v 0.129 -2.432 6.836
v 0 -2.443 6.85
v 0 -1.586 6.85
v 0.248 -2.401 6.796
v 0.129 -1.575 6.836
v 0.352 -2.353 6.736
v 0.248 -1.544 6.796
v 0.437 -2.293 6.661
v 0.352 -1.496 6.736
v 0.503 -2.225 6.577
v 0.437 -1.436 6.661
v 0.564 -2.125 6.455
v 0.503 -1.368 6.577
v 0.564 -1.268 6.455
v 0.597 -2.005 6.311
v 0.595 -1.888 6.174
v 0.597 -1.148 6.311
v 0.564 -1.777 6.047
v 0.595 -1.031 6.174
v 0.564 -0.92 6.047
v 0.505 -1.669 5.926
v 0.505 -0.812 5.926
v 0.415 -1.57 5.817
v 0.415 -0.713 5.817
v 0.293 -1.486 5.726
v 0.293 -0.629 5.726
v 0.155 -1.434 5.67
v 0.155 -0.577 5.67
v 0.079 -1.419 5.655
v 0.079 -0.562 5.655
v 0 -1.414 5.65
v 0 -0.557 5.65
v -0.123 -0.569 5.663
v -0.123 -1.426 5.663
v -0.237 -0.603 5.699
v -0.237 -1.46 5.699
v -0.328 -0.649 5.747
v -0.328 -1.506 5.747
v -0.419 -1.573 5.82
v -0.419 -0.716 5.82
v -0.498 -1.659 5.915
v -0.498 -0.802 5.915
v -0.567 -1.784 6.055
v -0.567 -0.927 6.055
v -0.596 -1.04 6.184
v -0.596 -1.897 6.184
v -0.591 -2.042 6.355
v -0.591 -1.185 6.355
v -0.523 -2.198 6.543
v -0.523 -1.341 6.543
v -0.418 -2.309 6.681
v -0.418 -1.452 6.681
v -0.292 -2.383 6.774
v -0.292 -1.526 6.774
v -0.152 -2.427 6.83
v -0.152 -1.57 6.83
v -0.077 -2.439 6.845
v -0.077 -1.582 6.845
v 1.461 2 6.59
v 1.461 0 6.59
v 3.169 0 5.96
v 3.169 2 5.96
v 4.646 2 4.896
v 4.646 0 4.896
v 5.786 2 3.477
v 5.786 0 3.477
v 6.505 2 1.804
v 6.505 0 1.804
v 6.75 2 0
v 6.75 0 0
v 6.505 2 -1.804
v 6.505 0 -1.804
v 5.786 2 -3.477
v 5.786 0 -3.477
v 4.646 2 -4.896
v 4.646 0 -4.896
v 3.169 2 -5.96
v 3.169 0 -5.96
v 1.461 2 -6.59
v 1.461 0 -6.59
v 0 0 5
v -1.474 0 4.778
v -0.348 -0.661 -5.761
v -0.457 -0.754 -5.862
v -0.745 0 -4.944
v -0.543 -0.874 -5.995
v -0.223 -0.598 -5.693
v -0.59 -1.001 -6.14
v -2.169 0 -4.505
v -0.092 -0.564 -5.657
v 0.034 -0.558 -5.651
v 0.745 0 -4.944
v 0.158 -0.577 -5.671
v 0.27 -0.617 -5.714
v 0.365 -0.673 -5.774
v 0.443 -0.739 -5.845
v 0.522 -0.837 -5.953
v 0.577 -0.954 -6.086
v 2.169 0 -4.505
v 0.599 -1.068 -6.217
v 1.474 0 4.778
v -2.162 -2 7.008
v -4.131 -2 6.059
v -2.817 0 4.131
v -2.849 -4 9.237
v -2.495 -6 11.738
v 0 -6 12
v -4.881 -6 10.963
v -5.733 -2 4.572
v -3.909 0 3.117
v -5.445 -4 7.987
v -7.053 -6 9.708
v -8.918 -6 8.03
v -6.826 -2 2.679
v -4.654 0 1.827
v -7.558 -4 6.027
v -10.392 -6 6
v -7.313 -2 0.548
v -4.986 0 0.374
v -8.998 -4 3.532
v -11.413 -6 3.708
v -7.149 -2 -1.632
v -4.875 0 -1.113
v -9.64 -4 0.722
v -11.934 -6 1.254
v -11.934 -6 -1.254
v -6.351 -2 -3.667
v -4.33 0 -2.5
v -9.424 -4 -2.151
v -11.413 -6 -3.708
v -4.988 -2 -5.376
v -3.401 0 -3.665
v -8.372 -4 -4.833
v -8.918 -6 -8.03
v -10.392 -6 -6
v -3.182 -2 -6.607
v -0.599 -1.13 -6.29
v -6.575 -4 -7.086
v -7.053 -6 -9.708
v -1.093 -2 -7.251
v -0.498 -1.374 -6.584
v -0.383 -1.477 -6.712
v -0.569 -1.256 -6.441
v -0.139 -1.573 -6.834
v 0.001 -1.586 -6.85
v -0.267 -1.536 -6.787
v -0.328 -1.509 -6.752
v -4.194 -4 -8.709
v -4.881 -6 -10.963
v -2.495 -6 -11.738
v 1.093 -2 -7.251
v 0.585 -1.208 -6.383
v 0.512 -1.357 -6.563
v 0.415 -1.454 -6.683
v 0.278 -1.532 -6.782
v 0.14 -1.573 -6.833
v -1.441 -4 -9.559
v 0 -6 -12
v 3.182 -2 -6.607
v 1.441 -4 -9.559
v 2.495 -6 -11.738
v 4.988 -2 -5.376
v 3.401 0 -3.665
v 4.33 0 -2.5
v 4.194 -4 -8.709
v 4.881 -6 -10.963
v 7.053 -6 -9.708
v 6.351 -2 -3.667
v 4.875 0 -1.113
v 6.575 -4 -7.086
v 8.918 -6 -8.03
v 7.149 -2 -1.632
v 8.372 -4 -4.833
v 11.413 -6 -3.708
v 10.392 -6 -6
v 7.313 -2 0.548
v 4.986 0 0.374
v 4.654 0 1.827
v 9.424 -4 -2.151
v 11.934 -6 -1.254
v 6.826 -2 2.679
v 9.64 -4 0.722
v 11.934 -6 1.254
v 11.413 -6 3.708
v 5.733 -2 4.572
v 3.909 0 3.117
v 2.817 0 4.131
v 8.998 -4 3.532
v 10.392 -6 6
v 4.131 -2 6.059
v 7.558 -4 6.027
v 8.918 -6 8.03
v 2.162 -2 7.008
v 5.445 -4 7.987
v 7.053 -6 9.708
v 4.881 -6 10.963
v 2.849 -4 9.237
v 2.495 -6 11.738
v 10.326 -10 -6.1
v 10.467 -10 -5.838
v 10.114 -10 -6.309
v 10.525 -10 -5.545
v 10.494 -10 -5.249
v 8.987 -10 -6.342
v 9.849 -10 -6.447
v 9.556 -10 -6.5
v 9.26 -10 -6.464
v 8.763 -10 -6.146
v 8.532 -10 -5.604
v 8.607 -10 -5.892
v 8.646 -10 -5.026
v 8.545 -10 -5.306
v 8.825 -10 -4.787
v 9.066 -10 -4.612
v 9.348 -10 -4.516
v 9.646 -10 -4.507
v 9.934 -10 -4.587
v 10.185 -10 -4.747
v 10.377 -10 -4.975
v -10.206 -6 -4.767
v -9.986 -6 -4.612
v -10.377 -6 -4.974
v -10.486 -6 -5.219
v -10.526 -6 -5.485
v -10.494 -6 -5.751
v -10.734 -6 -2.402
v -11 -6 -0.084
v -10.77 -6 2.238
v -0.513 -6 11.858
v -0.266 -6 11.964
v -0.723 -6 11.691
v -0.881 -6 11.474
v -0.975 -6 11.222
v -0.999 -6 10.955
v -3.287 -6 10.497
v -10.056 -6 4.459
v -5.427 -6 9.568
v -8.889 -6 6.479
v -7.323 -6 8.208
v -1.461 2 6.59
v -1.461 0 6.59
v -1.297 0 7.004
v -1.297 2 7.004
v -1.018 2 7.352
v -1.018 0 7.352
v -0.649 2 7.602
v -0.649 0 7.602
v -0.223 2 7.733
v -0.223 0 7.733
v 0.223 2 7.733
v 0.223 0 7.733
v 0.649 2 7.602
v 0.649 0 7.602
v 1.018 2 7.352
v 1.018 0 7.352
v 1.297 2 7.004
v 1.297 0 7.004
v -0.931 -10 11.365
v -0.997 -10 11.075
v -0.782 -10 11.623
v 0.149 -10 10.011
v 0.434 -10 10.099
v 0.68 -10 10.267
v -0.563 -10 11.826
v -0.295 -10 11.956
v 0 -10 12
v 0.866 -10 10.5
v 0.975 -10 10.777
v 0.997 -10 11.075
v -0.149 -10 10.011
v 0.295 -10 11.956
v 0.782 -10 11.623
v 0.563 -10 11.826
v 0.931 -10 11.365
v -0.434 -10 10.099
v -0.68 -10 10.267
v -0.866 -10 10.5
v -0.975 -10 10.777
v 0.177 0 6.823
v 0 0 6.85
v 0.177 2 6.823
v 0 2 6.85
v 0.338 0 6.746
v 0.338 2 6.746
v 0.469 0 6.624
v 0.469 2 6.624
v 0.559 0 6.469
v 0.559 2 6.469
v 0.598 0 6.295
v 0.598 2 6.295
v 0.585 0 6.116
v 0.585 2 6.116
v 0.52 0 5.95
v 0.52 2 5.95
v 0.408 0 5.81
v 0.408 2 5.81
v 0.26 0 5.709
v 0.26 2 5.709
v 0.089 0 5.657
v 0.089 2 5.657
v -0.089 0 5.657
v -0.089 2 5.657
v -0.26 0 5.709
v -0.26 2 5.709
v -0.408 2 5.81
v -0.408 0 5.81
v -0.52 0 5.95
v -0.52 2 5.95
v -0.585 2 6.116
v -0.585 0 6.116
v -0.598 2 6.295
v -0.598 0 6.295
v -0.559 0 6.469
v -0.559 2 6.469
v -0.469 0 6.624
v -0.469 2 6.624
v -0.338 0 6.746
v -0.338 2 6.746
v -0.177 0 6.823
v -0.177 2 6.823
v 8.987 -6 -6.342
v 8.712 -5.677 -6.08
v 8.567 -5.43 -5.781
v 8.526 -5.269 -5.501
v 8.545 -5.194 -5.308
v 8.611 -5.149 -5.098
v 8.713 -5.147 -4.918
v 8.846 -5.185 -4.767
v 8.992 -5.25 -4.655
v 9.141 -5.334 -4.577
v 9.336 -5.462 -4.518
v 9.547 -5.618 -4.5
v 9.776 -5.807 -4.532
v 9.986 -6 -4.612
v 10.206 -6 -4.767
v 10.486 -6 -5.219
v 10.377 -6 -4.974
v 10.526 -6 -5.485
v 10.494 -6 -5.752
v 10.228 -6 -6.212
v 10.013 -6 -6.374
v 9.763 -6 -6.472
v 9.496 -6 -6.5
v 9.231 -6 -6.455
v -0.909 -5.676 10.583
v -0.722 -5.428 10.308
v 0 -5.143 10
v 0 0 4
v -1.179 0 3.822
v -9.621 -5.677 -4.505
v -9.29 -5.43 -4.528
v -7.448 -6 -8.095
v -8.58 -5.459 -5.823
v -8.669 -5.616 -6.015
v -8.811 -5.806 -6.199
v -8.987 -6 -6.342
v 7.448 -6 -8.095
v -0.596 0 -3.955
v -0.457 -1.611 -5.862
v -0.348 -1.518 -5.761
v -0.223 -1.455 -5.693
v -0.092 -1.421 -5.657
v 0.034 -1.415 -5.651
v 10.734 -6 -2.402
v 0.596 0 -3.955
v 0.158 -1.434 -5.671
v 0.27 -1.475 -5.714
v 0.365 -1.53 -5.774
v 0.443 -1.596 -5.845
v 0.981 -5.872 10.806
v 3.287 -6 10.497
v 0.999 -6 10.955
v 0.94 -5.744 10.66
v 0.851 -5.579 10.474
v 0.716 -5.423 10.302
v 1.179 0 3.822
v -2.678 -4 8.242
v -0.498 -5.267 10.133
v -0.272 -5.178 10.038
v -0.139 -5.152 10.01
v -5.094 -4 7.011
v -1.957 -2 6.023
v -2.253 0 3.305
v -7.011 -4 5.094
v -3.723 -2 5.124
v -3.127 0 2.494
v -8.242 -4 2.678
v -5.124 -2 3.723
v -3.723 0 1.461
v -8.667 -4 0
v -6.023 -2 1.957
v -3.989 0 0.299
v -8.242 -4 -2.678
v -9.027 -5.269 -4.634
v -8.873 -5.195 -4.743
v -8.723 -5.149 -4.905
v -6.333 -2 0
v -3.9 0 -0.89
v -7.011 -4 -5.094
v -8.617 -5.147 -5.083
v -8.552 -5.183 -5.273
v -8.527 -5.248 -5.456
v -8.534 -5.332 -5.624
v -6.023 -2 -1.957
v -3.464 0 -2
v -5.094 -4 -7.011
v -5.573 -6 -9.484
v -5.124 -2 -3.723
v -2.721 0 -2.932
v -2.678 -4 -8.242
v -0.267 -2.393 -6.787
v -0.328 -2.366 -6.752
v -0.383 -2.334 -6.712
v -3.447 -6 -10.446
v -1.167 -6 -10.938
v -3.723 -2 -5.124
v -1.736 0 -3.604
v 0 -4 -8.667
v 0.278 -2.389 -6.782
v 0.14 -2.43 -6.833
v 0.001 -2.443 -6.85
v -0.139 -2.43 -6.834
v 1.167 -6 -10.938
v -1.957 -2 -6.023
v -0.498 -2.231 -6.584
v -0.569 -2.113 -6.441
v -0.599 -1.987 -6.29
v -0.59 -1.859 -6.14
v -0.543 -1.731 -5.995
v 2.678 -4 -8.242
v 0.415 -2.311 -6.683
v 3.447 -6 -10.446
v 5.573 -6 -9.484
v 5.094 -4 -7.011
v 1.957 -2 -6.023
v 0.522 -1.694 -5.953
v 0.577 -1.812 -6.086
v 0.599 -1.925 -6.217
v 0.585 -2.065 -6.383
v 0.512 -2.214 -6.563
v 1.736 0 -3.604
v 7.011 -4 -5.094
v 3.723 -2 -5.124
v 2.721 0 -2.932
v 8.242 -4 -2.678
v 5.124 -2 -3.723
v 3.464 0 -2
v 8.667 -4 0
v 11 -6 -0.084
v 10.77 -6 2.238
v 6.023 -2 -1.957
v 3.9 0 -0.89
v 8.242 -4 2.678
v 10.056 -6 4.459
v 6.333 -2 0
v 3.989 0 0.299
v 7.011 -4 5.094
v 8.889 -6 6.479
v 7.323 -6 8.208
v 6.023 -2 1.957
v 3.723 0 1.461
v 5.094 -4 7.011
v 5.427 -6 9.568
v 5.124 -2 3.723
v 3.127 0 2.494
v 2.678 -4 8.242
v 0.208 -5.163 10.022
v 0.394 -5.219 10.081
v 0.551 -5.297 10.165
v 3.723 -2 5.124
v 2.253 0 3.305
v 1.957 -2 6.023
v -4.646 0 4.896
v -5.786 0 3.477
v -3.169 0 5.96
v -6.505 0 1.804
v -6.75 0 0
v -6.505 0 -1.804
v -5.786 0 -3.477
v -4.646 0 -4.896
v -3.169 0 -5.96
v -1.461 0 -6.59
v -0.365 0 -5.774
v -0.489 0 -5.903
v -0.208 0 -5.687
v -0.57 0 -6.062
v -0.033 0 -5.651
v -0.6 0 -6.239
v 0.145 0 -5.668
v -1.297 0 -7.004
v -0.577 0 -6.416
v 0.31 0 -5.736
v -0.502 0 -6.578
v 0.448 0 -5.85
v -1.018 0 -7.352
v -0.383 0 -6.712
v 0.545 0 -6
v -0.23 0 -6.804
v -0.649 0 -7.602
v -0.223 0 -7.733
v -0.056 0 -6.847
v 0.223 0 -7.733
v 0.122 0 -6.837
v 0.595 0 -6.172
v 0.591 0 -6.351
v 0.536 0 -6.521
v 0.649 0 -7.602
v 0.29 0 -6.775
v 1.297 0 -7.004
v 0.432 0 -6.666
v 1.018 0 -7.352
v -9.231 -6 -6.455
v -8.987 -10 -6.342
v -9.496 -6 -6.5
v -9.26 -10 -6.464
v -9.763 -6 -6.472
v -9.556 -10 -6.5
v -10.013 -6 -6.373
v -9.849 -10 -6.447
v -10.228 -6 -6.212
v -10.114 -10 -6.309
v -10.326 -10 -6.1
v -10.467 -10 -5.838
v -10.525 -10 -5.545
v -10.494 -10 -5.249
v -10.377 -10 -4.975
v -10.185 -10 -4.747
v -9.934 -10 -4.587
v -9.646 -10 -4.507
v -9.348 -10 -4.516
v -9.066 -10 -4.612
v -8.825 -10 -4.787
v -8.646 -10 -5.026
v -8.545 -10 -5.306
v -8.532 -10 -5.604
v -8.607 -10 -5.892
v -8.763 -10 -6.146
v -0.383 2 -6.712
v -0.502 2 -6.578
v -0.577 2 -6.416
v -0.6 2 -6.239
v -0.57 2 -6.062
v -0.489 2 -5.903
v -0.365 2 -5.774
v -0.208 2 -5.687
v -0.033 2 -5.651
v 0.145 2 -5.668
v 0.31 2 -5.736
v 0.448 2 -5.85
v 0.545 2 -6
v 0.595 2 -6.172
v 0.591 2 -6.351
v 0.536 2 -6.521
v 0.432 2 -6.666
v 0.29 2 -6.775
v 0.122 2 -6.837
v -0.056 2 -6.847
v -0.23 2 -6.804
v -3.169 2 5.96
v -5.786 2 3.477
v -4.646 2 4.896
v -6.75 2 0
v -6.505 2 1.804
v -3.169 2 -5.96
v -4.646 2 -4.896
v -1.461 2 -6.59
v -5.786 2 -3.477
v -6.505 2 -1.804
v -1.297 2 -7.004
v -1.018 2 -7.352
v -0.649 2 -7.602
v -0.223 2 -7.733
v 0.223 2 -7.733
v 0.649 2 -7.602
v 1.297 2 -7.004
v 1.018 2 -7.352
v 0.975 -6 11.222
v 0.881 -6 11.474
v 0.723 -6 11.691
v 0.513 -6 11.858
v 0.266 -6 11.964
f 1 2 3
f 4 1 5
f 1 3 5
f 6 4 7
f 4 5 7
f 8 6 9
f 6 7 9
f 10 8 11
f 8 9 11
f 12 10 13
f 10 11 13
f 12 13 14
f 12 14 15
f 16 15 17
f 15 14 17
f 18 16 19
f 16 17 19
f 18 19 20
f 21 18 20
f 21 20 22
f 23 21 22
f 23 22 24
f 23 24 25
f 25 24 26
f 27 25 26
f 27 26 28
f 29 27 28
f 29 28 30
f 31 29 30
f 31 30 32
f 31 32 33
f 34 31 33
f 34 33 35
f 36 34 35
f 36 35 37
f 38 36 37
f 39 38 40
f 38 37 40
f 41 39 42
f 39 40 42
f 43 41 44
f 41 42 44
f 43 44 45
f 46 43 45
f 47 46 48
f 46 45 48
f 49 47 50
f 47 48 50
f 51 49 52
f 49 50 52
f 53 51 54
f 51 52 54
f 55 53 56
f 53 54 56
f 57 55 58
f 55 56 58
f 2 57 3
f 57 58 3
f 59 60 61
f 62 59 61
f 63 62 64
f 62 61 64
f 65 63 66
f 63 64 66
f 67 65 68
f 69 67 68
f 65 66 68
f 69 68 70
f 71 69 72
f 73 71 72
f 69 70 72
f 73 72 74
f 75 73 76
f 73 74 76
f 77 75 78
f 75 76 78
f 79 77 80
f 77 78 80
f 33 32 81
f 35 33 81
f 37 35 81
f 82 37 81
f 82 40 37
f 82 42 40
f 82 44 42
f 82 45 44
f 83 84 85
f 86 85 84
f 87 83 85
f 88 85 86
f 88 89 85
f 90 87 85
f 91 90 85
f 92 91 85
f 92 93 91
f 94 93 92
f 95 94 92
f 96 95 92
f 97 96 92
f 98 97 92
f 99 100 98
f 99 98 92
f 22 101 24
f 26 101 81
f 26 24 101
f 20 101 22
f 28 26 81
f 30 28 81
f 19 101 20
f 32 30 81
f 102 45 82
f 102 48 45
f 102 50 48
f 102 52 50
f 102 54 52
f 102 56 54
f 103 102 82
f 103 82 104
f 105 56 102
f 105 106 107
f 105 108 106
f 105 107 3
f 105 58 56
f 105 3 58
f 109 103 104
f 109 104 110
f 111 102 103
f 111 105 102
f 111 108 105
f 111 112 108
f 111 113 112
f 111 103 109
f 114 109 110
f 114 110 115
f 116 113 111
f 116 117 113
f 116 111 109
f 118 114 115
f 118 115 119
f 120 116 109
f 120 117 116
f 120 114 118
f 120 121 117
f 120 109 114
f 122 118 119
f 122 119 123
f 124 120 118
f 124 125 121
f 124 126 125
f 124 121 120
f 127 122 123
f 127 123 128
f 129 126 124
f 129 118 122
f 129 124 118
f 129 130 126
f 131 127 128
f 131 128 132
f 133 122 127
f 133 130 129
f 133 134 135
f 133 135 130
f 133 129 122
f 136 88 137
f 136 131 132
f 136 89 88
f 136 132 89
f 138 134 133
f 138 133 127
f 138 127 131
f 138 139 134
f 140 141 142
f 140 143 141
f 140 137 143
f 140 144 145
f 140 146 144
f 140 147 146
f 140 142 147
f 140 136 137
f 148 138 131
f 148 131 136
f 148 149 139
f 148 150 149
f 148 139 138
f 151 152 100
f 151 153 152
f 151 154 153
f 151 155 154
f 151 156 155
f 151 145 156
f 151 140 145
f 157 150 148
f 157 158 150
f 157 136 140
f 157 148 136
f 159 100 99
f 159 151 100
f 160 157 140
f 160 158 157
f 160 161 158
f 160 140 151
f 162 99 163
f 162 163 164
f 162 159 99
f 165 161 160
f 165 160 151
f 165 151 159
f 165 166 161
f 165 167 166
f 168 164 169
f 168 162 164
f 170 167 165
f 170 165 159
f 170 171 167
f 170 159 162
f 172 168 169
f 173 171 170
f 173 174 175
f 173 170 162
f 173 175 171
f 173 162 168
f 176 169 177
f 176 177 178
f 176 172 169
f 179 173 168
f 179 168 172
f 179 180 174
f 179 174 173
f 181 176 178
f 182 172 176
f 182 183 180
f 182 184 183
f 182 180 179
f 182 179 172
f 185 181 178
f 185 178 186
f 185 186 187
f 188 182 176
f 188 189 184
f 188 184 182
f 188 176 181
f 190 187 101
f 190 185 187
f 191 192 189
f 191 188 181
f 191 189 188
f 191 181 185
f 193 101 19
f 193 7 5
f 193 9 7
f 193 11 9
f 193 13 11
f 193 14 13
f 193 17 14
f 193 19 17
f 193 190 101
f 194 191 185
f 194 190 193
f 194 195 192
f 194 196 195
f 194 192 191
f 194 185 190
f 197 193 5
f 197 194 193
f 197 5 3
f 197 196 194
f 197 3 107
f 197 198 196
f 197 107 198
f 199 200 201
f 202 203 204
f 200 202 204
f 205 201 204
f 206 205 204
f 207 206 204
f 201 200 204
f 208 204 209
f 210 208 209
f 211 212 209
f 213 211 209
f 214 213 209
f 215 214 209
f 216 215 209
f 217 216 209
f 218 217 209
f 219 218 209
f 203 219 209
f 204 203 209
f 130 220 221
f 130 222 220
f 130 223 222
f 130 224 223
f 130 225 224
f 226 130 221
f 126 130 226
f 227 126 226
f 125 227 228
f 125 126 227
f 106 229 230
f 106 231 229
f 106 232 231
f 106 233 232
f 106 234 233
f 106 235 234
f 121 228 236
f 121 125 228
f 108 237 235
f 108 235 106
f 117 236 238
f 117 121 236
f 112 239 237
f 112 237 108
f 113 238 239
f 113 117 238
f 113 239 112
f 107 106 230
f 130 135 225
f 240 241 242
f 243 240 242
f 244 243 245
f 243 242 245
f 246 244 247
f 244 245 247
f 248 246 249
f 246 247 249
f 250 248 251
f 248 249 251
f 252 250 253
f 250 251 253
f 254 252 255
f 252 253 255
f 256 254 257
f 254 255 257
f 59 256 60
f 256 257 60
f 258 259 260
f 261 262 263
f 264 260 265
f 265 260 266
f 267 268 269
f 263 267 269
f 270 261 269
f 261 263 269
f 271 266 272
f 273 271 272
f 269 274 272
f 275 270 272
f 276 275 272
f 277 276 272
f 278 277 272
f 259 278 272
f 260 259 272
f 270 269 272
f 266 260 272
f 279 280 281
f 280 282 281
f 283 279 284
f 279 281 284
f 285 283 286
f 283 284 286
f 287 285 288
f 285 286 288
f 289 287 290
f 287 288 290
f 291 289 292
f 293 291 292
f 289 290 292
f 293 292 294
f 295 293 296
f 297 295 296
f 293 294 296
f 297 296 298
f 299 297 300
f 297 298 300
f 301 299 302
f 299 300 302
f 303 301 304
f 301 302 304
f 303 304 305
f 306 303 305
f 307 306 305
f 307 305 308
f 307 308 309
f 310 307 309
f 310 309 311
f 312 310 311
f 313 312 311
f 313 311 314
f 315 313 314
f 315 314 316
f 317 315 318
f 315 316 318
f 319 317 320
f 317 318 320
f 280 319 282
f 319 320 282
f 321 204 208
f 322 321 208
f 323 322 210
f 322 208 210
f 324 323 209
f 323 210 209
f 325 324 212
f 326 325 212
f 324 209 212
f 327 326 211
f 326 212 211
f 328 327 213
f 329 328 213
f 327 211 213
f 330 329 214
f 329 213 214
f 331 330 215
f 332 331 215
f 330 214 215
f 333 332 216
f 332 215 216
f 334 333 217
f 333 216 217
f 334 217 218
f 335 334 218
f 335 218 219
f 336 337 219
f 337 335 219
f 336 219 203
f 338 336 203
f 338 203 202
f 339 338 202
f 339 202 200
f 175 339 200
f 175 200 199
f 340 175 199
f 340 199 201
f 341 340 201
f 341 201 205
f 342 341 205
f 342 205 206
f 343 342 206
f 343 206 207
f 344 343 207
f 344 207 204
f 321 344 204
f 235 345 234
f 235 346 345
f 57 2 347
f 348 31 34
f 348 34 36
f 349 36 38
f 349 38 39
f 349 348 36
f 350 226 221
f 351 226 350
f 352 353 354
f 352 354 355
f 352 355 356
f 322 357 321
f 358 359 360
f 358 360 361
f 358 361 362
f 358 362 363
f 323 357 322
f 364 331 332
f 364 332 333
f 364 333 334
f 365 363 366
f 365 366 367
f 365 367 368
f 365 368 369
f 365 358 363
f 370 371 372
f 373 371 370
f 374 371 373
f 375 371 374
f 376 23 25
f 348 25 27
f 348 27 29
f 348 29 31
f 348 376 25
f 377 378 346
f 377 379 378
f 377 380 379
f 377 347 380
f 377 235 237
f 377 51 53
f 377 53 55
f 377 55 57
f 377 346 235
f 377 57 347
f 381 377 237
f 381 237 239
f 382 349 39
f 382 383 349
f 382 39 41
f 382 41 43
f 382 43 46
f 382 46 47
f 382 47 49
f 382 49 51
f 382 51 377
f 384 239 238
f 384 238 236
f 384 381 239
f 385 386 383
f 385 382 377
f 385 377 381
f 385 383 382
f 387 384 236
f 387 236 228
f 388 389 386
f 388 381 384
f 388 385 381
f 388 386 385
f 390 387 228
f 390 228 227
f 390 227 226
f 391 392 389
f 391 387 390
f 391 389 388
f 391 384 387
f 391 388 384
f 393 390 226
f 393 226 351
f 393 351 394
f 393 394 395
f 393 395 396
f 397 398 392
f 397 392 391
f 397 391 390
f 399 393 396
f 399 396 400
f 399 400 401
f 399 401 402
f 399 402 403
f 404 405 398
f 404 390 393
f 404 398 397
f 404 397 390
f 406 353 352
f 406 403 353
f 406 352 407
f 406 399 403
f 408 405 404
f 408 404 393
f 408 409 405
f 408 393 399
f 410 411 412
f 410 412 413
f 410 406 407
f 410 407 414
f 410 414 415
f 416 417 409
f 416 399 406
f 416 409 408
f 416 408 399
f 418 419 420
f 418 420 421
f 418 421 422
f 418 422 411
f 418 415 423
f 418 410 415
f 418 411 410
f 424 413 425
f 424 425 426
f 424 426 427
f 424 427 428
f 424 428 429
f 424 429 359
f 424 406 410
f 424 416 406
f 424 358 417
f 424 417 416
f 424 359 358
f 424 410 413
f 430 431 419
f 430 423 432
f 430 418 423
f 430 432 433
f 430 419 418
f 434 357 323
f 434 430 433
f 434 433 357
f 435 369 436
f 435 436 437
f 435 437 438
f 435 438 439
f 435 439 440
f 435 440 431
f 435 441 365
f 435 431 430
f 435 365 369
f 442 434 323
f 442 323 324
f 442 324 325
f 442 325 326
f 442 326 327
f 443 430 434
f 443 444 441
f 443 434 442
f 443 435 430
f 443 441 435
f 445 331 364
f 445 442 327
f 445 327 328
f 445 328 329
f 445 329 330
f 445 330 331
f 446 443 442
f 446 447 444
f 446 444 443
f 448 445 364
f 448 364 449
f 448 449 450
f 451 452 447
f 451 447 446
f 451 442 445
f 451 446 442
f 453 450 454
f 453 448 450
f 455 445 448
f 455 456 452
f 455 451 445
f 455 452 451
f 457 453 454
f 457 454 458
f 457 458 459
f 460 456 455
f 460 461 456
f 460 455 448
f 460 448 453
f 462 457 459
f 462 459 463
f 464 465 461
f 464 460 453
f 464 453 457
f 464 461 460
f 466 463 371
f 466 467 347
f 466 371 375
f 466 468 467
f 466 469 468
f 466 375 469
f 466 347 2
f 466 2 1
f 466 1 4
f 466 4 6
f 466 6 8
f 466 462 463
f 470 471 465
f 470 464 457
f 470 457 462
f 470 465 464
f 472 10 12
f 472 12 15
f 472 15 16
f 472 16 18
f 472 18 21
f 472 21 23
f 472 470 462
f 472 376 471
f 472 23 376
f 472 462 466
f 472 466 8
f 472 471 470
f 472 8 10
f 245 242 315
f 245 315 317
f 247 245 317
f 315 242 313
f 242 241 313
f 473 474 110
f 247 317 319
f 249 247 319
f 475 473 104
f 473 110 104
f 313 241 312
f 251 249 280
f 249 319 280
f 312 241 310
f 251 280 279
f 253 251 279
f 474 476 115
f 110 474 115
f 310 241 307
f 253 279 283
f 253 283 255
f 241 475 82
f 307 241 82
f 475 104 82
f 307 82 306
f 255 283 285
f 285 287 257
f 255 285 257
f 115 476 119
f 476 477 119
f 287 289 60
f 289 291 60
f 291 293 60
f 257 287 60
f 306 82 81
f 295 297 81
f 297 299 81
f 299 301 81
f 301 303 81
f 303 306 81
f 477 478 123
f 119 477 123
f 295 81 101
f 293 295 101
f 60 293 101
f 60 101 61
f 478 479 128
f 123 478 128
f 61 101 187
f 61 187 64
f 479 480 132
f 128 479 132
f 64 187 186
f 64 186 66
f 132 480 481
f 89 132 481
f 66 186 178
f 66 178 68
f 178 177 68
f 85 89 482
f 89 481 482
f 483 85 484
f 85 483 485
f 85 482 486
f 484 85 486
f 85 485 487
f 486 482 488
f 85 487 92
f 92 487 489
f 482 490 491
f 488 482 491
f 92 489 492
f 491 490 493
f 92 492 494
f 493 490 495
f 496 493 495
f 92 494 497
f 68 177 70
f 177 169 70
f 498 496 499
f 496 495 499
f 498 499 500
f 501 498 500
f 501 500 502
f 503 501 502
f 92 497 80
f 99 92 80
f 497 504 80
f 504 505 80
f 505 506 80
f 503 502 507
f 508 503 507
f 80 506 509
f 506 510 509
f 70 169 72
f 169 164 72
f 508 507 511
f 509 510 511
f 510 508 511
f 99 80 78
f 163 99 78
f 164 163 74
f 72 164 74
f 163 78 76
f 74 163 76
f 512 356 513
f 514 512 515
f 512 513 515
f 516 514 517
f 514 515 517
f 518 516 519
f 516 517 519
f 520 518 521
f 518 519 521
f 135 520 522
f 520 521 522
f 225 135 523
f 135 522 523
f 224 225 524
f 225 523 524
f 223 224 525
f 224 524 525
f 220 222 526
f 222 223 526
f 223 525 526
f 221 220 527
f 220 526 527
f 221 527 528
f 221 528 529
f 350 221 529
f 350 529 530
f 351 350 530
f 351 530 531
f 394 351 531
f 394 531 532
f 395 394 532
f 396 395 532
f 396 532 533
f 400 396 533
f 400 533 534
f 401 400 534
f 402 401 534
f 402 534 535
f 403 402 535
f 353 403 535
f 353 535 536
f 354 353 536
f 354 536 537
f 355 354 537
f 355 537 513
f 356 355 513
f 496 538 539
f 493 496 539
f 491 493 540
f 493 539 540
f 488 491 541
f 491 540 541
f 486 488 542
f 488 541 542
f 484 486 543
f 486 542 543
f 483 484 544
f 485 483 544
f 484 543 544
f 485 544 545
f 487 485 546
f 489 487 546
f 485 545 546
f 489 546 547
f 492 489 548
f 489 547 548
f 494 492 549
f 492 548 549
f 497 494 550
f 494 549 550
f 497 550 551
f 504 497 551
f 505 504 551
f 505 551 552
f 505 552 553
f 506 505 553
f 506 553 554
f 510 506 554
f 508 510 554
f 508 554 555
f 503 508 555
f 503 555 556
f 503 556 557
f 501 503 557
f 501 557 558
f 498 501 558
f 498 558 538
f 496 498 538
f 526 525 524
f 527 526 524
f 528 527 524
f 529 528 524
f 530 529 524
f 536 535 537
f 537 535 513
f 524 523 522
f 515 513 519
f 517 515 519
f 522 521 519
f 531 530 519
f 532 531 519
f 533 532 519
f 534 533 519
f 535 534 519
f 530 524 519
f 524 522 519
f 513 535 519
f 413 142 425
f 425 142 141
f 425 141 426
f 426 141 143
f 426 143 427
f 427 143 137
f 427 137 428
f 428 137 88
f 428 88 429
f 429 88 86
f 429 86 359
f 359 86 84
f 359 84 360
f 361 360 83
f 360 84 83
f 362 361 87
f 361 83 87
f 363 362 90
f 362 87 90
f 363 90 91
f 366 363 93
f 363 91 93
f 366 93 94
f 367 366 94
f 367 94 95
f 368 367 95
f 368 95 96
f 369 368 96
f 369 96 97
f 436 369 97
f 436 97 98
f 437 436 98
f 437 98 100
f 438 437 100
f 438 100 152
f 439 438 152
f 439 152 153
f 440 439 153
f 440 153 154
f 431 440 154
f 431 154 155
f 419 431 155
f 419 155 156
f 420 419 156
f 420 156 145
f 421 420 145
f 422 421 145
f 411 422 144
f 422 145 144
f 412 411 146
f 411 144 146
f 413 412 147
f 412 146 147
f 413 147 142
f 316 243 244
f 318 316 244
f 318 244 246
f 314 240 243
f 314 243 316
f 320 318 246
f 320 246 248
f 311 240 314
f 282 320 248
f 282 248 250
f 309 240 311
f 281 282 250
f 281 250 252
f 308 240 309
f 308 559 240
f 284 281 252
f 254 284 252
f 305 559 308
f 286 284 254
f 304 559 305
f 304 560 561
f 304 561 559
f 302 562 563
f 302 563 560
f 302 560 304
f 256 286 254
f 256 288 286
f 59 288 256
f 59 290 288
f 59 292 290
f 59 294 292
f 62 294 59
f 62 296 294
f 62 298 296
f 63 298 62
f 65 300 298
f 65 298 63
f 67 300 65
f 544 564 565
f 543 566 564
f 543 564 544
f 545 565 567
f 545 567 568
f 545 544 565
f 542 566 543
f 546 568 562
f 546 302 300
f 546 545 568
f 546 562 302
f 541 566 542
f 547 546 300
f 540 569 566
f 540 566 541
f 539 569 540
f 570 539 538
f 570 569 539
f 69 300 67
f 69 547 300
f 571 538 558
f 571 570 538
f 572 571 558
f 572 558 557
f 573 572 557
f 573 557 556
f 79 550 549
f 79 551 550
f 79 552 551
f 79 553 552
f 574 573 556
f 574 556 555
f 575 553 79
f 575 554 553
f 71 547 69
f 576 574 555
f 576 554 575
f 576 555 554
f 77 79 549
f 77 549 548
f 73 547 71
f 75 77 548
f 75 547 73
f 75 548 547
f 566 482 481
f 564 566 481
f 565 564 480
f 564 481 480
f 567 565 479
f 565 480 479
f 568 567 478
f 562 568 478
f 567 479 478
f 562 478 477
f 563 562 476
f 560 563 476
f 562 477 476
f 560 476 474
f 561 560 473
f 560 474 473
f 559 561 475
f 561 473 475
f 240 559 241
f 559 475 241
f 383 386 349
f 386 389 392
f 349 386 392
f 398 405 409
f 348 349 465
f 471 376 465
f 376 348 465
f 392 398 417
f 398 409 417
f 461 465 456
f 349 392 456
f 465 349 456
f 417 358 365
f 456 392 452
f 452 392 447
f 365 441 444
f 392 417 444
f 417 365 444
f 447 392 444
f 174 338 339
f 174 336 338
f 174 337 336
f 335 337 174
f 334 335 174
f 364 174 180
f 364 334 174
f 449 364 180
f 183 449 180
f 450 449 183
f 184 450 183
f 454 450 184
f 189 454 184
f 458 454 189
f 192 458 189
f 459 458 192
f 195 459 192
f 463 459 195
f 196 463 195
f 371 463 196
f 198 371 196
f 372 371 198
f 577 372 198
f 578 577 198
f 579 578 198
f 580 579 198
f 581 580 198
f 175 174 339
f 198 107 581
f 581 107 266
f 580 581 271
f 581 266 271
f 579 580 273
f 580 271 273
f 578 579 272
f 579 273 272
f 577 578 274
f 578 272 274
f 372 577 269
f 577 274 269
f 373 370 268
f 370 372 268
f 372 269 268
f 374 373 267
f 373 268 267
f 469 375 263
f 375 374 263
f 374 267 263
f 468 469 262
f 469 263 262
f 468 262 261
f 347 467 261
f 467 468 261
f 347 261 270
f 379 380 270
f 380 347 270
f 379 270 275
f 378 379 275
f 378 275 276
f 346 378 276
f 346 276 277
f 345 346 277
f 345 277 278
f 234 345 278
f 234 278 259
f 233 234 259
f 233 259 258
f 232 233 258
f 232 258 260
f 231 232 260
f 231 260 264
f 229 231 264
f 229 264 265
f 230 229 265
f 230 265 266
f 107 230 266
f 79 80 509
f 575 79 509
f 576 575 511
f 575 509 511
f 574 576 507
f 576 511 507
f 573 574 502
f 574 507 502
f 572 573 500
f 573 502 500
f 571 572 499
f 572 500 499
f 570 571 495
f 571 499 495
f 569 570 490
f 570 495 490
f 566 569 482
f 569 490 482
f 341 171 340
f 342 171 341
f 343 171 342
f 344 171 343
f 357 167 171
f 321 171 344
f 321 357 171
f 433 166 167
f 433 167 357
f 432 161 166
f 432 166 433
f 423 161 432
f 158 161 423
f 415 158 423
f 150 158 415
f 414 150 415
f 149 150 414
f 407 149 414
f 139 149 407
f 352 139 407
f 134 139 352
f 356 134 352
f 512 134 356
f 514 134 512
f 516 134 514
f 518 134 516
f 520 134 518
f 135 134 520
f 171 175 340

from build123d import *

# Parameters (mm, degrees)
BOSS_EXTRUDE4_DEPTH = 2
BOSS_EXTRUDE3_REACH = 22.785
PEG_R               = 1
SKETCH4_R           = 0.6
CUT_EXTRUDE1_DEPTH  = 21.784609806


with BuildPart() as part:
    # Sketch1 → Boss-Extrude4 (new body)
    with BuildSketch(Plane(origin=(0, 0, 0), x_dir=(1, 0, 0), z_dir=(0, 1, 0))):
        with BuildLine():
            ThreePointArc((1.460958589, -6.59), (6.75, 0), (1.460958589, 6.59))
            ThreePointArc((1.460958589, 6.59), (0, 7.75), (-1.460958589, 6.59))
            ThreePointArc((-1.460958589, 6.59), (-6.75, 0), (-1.460958589, -6.59))
            ThreePointArc((-1.460958589, -6.59), (0, -7.75), (1.460958589, -6.59))
        make_face()
    extrude(amount=BOSS_EXTRUDE4_DEPTH)

    # Sketch3 → Revolve1 (revolve)
    with BuildSketch(Plane(origin=(0, 0, 0), x_dir=(0, 0, -1), z_dir=(1, 0, 0))):
        Polygon((-4, 0), (-5, 0), (-12, -6), (-11, -6), align=None)
    revolve(axis=Axis((0, 0.65, 0), (0, -1, 0)))

    # Peg → Boss-Extrude3 (add, up to next)
    with BuildSketch(Plane(origin=(0, -10, 0), x_dir=(1, 0, 0), z_dir=(0, 1, 0)), mode=Mode.PRIVATE) as boss_extrude3_sk1:
        with Locations((0, -11)):
            Circle(PEG_R)
    boss_extrude3_tool1 = extrude(boss_extrude3_sk1.sketch, amount=BOSS_EXTRUDE3_REACH, mode=Mode.PRIVATE) - part.part
    # Peg → Boss-Extrude3 (add, up to next)
    with BuildSketch(Plane(origin=(0, -10, 0), x_dir=(1, 0, 0), z_dir=(0, 1, 0)), mode=Mode.PRIVATE) as boss_extrude3_sk2:
        with Locations((-9.526279442, 5.5)):
            Circle(PEG_R)
    boss_extrude3_tool2 = extrude(boss_extrude3_sk2.sketch, amount=BOSS_EXTRUDE3_REACH, mode=Mode.PRIVATE) - part.part
    # Peg → Boss-Extrude3 (add, up to next)
    with BuildSketch(Plane(origin=(0, -10, 0), x_dir=(1, 0, 0), z_dir=(0, 1, 0)), mode=Mode.PRIVATE) as boss_extrude3_sk3:
        with Locations((9.526279442, 5.5)):
            Circle(PEG_R)
    boss_extrude3_tool3 = extrude(boss_extrude3_sk3.sketch, amount=BOSS_EXTRUDE3_REACH, mode=Mode.PRIVATE) - part.part
    add(boss_extrude3_tool1.solids().sort_by_distance((0, -10, 11))[0])
    add(boss_extrude3_tool2.solids().sort_by_distance((-9.526279, -10, -5.5))[0])
    add(boss_extrude3_tool3.solids().sort_by_distance((9.526279, -10, -5.5))[0])

    # Sketch4 → Cut-Extrude1 (cut, through all)
    with BuildSketch(Plane(origin=(0, 2, 0), x_dir=(1, 0, 0), z_dir=(0, 1, 0))):
        with Locations((0, 6.25)):
            Circle(SKETCH4_R)
        with Locations((0, -6.25)):
            Circle(SKETCH4_R)
    extrude(amount=-CUT_EXTRUDE1_DEPTH, mode=Mode.SUBTRACT)


solid = part.part
